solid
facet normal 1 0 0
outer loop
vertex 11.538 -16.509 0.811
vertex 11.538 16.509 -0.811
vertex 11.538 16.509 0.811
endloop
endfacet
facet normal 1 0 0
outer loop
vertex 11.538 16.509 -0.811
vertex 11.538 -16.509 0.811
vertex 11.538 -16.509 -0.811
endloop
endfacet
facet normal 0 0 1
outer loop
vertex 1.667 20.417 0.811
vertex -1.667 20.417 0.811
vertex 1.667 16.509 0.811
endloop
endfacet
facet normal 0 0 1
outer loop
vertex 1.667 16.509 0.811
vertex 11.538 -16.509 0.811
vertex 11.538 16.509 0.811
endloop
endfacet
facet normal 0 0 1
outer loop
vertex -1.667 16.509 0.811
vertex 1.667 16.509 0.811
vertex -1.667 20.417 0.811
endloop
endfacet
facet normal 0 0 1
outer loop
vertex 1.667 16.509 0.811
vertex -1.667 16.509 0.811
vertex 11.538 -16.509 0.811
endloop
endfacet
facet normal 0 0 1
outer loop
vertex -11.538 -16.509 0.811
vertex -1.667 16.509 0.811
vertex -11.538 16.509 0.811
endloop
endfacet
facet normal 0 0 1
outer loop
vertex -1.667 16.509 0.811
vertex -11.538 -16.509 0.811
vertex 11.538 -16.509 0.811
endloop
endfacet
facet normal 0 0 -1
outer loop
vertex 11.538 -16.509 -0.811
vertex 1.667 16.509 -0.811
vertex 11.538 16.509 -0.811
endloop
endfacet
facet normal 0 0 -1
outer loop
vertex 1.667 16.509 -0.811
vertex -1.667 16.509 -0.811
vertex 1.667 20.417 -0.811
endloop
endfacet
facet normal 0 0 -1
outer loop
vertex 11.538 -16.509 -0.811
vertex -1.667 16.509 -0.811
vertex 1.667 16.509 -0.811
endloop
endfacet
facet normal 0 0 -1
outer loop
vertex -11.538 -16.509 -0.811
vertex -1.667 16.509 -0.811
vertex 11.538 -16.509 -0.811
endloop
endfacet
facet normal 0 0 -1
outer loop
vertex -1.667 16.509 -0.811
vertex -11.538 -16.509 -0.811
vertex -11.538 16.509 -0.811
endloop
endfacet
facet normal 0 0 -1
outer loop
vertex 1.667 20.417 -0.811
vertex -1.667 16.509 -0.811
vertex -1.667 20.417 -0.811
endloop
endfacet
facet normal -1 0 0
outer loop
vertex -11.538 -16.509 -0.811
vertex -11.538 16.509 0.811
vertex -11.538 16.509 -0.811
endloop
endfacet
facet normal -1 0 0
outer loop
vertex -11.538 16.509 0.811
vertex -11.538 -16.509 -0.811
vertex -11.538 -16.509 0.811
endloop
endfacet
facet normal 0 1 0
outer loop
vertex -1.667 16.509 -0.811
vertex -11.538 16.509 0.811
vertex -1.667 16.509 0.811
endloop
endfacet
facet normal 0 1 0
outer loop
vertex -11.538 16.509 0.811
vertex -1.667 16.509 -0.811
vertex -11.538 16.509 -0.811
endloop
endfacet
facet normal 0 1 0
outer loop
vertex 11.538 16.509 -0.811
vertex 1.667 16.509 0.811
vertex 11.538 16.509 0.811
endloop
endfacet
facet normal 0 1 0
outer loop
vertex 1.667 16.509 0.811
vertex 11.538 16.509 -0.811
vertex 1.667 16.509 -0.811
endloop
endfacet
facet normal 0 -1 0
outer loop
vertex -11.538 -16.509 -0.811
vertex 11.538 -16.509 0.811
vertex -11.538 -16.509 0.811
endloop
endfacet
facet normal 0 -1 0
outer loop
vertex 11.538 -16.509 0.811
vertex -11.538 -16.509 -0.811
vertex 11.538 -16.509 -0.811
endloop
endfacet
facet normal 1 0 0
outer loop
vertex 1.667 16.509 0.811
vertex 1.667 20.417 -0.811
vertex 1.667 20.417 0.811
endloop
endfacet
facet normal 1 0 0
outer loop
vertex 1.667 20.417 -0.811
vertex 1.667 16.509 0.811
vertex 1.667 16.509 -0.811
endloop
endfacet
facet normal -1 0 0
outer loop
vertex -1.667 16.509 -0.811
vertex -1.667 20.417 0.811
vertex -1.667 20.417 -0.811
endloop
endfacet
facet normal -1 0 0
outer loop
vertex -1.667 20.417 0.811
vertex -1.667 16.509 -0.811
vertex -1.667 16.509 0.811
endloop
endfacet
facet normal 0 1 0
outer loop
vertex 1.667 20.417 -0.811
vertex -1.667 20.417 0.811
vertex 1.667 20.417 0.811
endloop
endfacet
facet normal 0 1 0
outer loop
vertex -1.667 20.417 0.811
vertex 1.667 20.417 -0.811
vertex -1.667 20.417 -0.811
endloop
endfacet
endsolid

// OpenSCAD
width=30;

depth=35;

height=30;

cube([width/1.3,depth/1.06,height/18.5],center=true);

translate([0,depth/2,0])cube([width/9,depth/6,height/18.5],center=true); 
